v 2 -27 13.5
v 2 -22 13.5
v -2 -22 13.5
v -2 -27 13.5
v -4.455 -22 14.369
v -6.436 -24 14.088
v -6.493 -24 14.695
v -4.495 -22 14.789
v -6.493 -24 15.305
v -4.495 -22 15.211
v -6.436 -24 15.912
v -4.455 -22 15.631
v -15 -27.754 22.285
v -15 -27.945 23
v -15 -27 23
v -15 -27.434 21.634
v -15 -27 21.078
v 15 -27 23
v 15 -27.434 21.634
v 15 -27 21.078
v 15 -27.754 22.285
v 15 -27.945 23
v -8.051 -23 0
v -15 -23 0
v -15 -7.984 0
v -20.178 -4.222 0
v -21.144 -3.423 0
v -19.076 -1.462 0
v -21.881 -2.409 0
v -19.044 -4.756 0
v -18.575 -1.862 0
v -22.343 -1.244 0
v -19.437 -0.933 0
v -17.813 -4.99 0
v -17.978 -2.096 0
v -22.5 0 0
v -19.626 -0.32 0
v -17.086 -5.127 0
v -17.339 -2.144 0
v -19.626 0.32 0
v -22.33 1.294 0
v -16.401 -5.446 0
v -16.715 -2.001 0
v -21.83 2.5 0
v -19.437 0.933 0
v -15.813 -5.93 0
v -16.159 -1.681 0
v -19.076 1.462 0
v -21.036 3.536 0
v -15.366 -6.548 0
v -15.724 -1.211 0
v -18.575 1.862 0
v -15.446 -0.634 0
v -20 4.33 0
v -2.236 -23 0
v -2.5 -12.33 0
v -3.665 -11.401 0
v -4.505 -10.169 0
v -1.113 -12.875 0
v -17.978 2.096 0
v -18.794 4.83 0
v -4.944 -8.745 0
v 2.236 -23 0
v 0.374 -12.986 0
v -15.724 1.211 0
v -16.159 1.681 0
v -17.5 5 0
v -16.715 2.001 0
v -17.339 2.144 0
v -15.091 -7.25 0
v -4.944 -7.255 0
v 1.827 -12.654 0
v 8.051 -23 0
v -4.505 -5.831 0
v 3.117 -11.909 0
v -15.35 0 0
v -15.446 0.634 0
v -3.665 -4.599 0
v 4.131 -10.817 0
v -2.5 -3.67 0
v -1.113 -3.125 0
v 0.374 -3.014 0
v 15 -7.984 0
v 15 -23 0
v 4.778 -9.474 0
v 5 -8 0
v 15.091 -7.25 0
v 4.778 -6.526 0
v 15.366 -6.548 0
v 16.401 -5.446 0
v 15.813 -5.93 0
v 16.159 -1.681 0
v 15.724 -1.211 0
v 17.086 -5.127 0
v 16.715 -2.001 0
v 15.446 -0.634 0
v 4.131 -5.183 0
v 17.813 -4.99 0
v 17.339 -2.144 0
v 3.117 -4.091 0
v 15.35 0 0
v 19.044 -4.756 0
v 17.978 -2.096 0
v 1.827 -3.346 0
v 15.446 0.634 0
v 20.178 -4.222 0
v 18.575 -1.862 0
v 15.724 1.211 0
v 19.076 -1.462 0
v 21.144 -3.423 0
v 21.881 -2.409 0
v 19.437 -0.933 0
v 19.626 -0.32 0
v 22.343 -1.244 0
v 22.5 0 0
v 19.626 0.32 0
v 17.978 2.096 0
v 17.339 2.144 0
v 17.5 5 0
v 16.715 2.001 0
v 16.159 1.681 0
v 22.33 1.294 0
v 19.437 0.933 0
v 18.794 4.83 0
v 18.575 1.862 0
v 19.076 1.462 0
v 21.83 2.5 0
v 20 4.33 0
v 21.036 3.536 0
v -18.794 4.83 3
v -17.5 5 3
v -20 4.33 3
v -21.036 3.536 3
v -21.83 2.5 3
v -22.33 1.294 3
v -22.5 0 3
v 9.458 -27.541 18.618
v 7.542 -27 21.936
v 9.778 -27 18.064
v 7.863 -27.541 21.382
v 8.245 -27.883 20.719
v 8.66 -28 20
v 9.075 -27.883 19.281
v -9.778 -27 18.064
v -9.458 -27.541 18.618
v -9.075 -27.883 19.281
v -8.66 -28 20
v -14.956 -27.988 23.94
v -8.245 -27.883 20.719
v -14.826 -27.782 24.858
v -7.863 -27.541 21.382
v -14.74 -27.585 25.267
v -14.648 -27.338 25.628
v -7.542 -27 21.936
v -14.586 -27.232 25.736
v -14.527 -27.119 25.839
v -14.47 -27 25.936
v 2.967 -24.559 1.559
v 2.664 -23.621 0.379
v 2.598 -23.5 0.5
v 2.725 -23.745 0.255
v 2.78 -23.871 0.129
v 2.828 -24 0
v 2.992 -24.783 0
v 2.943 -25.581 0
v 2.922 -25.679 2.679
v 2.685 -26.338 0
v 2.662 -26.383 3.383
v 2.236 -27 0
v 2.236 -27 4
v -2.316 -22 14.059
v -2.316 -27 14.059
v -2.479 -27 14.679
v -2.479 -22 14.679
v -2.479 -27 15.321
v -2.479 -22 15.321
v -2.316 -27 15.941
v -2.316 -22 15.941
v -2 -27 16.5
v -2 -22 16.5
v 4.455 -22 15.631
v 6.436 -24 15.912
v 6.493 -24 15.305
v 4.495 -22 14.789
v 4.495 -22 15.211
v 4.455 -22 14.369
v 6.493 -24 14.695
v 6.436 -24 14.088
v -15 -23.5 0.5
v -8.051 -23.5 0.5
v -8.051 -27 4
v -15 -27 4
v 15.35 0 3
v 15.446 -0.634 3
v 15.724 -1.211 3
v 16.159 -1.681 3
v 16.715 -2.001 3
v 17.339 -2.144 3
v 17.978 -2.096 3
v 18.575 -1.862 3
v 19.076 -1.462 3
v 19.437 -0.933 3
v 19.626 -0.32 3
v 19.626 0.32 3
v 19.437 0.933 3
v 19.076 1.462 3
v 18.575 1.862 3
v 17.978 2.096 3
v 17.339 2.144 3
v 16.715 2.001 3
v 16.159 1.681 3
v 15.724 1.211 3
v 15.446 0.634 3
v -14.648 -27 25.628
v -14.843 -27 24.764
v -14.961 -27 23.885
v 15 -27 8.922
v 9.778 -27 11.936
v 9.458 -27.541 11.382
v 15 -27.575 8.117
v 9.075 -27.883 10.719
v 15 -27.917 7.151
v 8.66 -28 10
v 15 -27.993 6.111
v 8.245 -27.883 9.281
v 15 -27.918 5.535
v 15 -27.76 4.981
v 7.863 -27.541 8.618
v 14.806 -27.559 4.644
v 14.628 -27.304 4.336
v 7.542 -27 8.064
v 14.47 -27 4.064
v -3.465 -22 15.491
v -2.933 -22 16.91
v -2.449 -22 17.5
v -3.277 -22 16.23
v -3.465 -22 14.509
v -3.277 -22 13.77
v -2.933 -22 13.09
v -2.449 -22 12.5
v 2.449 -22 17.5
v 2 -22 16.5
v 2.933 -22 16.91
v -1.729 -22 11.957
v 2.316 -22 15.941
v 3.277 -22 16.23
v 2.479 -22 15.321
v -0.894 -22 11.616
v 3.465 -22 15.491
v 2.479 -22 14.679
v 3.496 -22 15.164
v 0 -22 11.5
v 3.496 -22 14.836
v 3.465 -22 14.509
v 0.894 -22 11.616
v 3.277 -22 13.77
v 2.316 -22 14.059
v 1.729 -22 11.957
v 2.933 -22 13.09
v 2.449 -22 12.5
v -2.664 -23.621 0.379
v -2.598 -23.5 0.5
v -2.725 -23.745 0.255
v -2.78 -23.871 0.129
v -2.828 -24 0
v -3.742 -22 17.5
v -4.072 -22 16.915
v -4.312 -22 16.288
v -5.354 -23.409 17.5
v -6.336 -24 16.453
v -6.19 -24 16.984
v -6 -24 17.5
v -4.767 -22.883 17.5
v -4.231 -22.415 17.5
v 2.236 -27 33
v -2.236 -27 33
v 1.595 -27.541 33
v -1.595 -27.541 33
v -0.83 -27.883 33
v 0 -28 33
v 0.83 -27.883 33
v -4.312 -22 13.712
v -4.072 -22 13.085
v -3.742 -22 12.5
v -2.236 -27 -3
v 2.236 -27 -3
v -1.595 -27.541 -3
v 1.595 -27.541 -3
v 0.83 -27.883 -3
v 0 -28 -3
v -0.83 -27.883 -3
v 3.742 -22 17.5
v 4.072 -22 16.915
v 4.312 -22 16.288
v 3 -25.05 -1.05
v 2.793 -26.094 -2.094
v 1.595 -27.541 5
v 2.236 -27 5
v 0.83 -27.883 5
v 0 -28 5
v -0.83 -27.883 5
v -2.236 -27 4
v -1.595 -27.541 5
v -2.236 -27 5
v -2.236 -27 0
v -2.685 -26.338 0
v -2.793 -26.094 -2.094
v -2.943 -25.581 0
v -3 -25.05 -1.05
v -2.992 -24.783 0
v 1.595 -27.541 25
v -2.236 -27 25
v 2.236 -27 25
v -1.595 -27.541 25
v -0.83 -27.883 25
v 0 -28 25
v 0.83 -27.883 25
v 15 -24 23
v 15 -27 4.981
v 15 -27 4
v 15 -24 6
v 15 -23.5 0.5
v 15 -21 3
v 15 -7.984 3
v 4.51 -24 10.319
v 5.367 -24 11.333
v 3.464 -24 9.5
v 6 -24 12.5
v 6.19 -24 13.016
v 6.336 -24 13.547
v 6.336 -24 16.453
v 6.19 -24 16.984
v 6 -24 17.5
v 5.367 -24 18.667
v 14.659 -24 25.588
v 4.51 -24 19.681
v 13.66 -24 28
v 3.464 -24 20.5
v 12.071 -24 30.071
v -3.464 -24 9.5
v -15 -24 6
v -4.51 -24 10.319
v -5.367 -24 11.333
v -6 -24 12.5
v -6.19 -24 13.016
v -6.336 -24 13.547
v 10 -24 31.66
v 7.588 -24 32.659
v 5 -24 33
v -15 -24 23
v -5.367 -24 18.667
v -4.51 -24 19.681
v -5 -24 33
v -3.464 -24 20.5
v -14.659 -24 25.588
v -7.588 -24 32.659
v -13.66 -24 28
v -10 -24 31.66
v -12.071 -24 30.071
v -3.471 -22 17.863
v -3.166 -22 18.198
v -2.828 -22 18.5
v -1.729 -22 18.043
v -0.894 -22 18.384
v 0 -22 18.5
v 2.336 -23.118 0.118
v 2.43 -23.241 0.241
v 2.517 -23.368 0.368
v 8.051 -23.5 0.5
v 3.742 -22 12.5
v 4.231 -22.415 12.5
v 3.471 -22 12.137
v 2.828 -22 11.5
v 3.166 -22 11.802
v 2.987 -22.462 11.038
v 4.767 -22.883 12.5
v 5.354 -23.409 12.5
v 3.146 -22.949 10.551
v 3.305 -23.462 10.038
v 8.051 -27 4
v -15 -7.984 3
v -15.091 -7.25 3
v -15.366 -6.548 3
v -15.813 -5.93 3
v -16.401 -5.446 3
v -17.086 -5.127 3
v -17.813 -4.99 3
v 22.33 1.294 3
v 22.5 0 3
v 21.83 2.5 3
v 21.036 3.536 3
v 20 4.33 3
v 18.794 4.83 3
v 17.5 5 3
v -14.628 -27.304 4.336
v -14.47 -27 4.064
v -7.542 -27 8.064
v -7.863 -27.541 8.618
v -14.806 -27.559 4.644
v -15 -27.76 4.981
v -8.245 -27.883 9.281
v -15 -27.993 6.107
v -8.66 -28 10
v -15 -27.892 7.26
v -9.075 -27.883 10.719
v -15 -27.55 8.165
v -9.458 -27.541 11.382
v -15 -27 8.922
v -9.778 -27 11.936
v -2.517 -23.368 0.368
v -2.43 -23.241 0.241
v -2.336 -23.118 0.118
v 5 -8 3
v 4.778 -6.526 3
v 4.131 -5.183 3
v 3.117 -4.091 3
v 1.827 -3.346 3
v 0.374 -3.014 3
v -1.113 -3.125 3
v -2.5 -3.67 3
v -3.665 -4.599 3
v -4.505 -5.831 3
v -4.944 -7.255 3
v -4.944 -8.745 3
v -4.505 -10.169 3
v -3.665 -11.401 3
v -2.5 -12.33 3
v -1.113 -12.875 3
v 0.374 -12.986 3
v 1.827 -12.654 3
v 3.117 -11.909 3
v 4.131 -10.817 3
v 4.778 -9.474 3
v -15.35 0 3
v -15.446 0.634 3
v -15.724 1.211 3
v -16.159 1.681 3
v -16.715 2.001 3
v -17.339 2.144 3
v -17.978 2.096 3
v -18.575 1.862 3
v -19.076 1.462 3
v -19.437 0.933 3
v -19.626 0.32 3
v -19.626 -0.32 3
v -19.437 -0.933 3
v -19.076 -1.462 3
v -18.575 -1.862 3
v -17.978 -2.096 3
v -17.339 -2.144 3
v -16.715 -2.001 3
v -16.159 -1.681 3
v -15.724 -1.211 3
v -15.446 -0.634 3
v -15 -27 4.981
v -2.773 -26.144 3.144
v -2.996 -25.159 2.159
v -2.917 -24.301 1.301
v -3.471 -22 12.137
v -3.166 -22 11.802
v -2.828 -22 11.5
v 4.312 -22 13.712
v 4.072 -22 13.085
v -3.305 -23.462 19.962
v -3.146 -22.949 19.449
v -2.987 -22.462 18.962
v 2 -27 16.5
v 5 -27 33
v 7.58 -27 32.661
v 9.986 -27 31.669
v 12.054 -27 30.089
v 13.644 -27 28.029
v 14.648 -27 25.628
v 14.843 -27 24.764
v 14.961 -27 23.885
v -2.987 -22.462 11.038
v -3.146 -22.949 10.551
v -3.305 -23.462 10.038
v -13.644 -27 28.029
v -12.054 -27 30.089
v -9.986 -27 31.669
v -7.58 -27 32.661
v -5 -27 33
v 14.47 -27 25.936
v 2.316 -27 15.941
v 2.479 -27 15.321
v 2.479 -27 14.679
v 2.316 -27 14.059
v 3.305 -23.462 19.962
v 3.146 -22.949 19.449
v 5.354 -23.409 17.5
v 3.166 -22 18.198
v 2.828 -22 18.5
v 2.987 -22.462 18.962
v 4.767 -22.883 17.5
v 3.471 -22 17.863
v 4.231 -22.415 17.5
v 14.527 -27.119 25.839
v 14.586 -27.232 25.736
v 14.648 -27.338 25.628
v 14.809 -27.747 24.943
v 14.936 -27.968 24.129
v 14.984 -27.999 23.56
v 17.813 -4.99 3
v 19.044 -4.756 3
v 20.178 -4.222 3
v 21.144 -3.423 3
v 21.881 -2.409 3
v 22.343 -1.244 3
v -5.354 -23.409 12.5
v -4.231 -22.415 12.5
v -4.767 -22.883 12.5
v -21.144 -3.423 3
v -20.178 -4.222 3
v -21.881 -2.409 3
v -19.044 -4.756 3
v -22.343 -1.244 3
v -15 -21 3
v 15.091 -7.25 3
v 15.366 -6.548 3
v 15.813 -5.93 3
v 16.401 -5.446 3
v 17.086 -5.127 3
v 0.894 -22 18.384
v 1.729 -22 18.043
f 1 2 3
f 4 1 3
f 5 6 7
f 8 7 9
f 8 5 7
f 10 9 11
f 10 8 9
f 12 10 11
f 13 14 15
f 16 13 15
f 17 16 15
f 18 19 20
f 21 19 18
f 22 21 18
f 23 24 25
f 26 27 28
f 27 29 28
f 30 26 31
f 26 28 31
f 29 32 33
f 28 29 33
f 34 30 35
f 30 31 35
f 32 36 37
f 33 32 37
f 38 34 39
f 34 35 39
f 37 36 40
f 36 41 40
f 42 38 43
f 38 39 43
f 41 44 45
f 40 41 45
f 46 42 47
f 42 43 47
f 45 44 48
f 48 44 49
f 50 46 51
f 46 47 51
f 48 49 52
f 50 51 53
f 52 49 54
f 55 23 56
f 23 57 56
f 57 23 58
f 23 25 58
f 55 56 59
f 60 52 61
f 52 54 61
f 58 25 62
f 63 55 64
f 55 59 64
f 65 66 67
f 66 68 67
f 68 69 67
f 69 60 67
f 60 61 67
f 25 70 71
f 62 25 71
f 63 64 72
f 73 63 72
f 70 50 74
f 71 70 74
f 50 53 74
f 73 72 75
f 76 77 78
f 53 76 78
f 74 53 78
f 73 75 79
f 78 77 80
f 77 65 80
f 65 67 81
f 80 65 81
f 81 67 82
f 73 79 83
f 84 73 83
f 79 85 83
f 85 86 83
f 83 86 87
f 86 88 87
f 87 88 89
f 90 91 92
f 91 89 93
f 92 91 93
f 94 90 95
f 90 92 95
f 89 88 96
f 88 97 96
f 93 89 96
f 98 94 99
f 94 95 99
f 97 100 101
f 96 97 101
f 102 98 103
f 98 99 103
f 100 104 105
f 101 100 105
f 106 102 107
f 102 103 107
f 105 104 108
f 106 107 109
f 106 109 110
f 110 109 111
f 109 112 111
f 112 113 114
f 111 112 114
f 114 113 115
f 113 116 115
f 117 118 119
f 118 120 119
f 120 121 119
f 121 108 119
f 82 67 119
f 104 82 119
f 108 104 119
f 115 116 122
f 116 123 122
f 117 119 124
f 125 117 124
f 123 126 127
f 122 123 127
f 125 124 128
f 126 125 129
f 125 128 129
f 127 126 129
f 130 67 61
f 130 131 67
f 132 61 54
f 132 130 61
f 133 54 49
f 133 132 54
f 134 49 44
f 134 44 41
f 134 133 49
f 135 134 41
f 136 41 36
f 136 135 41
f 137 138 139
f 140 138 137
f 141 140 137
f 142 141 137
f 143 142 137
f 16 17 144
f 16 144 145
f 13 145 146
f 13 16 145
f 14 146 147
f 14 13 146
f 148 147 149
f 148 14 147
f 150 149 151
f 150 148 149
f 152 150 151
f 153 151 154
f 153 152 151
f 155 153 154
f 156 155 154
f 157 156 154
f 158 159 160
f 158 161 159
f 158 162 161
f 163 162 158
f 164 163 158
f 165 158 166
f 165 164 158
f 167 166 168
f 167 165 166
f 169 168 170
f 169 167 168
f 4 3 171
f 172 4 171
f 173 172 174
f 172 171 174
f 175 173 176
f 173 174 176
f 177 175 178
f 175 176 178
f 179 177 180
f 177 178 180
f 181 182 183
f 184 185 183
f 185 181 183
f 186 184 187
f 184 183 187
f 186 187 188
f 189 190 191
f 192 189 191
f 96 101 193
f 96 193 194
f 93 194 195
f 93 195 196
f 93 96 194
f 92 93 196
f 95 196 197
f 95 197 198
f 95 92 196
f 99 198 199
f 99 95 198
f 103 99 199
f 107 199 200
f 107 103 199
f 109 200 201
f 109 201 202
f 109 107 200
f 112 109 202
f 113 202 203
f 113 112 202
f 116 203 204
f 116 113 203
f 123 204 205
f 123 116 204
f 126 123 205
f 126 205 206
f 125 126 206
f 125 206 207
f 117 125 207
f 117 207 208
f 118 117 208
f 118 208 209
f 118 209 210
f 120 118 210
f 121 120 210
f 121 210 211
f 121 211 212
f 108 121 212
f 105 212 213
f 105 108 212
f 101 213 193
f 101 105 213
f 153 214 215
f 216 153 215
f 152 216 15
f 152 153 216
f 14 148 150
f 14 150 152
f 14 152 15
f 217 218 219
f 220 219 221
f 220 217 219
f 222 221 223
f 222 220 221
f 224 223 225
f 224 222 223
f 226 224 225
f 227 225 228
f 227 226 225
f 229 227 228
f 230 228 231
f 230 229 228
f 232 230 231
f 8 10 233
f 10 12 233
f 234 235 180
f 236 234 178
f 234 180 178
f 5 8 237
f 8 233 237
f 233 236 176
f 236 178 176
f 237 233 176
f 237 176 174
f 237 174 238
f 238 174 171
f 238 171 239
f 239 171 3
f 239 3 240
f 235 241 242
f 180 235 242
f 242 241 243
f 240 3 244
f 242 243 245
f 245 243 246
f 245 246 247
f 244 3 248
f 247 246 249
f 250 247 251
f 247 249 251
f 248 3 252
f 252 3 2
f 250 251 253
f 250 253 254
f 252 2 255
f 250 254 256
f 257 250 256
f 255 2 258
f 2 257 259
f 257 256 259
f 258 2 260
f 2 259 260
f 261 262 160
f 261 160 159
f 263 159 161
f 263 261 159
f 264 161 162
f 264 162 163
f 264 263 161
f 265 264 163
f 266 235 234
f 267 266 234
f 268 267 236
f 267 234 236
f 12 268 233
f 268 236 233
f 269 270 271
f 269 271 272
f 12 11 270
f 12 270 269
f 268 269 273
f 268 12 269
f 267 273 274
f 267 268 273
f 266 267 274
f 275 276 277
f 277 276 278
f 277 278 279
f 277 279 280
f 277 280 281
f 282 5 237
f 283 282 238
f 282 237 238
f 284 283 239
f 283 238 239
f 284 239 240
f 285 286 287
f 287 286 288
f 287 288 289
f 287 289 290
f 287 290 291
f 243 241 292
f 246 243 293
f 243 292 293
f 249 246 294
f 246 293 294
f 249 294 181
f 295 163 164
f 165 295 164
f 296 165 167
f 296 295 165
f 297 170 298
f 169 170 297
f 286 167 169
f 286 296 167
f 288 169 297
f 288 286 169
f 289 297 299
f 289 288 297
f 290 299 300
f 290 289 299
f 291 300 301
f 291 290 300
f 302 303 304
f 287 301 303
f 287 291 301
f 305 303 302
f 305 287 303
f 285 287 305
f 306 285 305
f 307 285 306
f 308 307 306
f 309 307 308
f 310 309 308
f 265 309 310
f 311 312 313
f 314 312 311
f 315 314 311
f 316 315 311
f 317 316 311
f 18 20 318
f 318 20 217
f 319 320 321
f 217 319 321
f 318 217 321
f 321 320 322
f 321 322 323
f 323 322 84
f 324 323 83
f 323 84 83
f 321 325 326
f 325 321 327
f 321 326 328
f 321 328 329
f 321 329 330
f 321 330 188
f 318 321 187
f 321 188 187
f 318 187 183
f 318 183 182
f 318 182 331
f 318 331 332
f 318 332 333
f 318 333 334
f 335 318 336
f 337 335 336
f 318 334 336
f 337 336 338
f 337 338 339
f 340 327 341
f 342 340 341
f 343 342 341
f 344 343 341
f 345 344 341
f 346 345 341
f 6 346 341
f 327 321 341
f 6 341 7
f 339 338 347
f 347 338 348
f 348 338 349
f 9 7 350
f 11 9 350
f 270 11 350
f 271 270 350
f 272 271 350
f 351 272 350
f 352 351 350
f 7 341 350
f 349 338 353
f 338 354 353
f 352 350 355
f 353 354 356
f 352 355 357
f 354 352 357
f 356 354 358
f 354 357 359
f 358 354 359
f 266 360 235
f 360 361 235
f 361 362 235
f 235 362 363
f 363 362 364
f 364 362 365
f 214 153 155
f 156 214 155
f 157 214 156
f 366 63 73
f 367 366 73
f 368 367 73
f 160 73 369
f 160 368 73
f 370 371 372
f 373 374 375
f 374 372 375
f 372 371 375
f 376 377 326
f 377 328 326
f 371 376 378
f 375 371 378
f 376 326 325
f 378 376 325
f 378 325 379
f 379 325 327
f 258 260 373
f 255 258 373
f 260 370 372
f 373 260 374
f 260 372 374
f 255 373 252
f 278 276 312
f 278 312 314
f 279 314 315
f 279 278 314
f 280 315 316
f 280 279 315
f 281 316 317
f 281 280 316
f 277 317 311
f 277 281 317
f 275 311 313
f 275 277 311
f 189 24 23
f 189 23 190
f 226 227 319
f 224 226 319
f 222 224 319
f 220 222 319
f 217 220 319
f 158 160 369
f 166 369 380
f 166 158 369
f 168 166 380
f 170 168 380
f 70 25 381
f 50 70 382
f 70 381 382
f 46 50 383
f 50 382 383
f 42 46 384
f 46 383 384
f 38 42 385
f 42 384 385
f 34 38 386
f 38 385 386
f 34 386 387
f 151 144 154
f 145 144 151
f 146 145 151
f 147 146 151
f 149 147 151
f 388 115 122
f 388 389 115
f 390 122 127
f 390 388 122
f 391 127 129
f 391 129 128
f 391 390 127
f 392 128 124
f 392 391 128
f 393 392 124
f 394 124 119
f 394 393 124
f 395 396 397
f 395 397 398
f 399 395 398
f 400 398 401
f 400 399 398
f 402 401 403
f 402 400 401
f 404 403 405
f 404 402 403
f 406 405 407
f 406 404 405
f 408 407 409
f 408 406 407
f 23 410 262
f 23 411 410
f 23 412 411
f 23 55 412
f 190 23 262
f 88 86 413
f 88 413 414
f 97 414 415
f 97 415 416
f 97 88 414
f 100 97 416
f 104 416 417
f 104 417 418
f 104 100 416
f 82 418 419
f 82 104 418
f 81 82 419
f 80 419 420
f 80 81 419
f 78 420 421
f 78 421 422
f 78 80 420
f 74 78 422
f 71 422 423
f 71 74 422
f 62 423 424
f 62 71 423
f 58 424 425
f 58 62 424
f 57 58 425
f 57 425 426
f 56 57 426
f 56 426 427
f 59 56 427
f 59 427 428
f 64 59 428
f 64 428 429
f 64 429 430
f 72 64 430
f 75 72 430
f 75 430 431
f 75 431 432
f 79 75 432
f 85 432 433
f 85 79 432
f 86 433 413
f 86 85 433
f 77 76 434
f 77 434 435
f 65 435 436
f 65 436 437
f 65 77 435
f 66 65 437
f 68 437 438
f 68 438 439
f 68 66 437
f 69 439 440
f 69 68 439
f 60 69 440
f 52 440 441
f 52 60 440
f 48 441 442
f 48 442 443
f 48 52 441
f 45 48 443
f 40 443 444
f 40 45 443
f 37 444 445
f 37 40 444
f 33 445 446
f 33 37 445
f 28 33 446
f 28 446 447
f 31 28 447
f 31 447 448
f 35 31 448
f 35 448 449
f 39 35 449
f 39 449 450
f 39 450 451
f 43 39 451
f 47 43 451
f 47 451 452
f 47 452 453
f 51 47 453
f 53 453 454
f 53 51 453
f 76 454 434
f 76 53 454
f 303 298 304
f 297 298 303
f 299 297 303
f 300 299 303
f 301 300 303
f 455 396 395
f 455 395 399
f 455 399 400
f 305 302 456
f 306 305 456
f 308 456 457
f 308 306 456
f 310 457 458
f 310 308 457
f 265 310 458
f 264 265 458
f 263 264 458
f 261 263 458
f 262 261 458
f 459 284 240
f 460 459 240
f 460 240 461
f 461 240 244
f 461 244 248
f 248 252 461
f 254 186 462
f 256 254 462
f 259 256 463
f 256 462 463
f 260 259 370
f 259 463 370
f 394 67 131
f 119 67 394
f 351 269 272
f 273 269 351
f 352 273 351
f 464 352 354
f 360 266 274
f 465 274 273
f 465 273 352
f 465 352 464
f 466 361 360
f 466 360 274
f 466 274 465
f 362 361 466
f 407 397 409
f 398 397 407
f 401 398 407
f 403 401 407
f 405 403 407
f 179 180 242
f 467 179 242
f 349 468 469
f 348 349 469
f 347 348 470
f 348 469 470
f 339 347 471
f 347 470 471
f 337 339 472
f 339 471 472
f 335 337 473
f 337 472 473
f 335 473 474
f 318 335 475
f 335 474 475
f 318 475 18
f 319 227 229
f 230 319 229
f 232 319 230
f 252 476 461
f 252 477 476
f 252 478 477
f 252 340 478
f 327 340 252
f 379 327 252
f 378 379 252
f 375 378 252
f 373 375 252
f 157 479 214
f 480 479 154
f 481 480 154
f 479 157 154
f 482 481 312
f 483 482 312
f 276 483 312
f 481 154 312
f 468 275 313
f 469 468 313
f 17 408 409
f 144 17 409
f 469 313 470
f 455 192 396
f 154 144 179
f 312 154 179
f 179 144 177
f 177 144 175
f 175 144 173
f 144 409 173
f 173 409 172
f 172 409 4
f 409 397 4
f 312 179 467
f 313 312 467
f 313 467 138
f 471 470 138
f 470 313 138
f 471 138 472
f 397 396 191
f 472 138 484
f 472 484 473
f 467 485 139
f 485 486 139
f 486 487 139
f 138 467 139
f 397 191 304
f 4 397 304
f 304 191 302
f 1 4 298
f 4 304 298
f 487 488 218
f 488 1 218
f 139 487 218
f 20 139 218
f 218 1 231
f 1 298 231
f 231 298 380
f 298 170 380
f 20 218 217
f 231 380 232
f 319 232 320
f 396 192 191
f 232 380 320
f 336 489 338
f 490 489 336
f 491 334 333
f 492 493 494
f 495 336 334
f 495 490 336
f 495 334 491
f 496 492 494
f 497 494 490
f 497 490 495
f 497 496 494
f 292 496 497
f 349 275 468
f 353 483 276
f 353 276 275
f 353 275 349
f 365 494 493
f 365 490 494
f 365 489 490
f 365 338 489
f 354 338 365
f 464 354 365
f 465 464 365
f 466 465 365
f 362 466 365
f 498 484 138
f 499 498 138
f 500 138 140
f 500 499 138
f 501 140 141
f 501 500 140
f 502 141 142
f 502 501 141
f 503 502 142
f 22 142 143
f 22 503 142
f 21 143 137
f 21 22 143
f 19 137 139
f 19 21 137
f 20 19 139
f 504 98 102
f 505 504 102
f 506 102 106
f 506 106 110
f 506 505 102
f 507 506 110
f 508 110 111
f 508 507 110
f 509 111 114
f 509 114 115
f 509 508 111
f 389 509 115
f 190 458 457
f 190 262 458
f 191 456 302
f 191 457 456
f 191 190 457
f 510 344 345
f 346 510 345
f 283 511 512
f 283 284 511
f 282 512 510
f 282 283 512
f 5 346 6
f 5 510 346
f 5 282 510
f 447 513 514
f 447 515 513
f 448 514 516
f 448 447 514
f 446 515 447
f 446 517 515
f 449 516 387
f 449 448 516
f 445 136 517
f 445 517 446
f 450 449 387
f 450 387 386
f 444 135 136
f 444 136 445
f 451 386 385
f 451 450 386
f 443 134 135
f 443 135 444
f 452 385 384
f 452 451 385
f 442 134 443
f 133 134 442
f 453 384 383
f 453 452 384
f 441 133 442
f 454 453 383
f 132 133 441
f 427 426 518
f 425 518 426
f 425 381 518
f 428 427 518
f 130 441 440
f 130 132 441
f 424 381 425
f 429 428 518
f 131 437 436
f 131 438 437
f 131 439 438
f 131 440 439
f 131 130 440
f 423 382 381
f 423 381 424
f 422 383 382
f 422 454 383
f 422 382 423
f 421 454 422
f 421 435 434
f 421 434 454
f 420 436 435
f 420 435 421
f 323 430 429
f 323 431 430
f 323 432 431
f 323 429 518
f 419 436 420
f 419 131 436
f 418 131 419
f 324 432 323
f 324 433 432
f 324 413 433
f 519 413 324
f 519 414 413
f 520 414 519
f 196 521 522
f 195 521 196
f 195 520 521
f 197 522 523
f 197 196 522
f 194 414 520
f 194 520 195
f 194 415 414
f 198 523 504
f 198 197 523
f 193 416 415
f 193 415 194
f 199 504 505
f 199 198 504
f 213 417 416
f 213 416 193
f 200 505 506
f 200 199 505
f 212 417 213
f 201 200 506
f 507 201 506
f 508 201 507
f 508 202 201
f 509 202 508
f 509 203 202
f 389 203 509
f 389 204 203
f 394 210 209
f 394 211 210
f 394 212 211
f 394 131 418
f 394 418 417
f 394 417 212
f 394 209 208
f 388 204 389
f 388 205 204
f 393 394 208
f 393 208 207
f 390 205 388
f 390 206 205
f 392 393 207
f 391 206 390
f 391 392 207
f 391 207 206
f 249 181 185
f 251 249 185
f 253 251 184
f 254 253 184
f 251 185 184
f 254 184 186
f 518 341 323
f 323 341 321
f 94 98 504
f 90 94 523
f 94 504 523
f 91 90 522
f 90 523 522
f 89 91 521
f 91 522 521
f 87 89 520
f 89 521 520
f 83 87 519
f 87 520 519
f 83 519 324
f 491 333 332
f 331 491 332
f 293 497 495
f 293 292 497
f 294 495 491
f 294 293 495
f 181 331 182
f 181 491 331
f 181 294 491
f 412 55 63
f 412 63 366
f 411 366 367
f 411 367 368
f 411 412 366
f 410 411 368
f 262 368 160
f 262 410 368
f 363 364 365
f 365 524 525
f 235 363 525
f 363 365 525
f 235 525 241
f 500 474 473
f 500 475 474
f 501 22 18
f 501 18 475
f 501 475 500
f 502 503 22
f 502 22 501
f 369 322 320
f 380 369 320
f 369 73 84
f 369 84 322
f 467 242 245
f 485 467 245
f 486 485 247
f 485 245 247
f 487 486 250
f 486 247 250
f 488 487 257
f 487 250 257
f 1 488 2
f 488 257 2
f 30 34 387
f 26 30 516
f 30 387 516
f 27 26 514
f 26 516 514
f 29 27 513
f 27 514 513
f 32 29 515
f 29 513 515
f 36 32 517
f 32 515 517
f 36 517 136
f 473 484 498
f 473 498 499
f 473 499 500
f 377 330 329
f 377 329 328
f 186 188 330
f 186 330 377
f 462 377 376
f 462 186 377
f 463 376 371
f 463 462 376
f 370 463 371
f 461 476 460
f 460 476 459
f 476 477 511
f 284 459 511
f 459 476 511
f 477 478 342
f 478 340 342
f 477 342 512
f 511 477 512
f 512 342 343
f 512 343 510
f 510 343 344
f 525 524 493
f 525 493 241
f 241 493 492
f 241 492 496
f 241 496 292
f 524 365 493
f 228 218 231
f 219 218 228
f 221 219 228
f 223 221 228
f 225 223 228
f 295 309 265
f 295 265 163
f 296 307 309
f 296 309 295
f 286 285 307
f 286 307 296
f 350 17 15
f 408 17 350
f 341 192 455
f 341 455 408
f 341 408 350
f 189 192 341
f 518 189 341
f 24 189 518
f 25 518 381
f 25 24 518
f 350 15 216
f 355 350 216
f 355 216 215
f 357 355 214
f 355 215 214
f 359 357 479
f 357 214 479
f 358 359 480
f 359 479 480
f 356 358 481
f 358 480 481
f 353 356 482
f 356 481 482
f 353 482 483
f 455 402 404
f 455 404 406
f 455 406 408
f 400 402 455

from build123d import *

# Parameters (mm, degrees)
SKETCH1_W               = 45
SKETCH1_H               = 32
SKETCH1_R               = 2.15
SKETCH1_R_2             = 5
BOSS_EXTRUDE1_DEPTH     = 3
SKETCH3_W               = 30
SKETCH3_H               = 3
EXTRUDE_THIN1_DEPTH     = 15
CUT_EXTRUDE1_DEPTH      = 50.35838328
CUT_EXTRUDE2_DEPTH      = 47.208765402
CUT_EXTRUDE2_DEPTH_BACK = 47.208765402
SKETCH5_W               = 7.5
SKETCH5_H               = 22
EXTRUDE_THIN2_START     = 2
EXTRUDE_THIN2_DEPTH     = 2
CHAMFER1_SIZE           = 3
BOSS_EXTRUDE3_DEPTH     = 8
CIRPATTERN1_COUNT       = 6
CHAMFER4_SIZE           = 3
FILLET1_R               = 10
CHAMFER2_SIZE           = 4
CHAMFER3_SIZE           = 3
FILLET2_R               = 5
FILLET3_R               = 3
INTERSECT1_START        = -28.000000924
INTERSECT1_DEPTH        = 1.000000924


# Read off the part's stored shape, not the designer's step: Intersect1
# Some blends are built 0.0001 mm under size
with BuildPart() as part:
    # Sketch1 → Boss-Extrude1 (new body)
    with BuildSketch(Plane.XY):
        with Locations((0, -11)):
            Rectangle(SKETCH1_W, SKETCH1_H)
        with Locations((-17.5, 0)):
            Circle(SKETCH1_R, mode=Mode.SUBTRACT)
        with Locations(Location((17.5, 0, 0), (0, 0, 180))):
            Circle(SKETCH1_R, mode=Mode.SUBTRACT)
        with Locations((0, -8)):
            Circle(SKETCH1_R_2, mode=Mode.SUBTRACT)
    extrude(amount=BOSS_EXTRUDE1_DEPTH)

    # Sketch3 → Extrude-Thin1 (add, symmetric)
    with BuildSketch(Plane.ZY):
        with Locations((18, -25.5)):
            Rectangle(SKETCH3_W, SKETCH3_H)
    extrude(amount=EXTRUDE_THIN1_DEPTH, both=True)

    # Sketch4 → Cut-Extrude1 (cut, through all)
    with BuildSketch(Plane(origin=(0, -24, 0), x_dir=(1, 0, 0), z_dir=(0, 1, 0))):
        with BuildLine():
            Line((-2, -13.5), (2, -13.5))
            ThreePointArc((2, -13.5), (2.5, -15), (2, -16.5))
            Line((2, -16.5), (-2, -16.5))
            ThreePointArc((-2, -16.5), (-2.5, -15), (-2, -13.5))
        make_face()
    extrude(amount=-CUT_EXTRUDE1_DEPTH, mode=Mode.SUBTRACT)

    # Sketch5 → Cut-Extrude2 (cut, two sides: drawn at the far end of the back side and taken through both)
    with BuildSketch(Plane.XY.offset(3).offset(-CUT_EXTRUDE2_DEPTH_BACK)):
        with Locations((-18.75, -16)):
            Rectangle(SKETCH5_W, SKETCH5_H)
        with Locations((18.75, -16)):
            Rectangle(SKETCH5_W, SKETCH5_H)
    extrude(amount=CUT_EXTRUDE2_DEPTH + CUT_EXTRUDE2_DEPTH_BACK, mode=Mode.SUBTRACT)

    # Sketch6 → Extrude-Thin2 (add)
    with BuildSketch(Plane(origin=(0, -24, 0), x_dir=(1, 0, 0), z_dir=(0, 1, 0)).offset(EXTRUDE_THIN2_START)):
        with BuildLine():
            Line((-2.449489743, -17.5), (2.449489743, -17.5))
            ThreePointArc((2.449489743, -17.5), (3.5, -15), (2.449489743, -12.5))
            Line((2.449489743, -12.5), (-2.449489743, -12.5))
            ThreePointArc((-2.449489743, -12.5), (-3.5, -15), (-2.449489743, -17.5))
        make_face()
        with BuildLine():
            Line((-2, -16.5), (2, -16.5))
            ThreePointArc((2, -16.5), (2.5, -15), (2, -13.5))
            Line((2, -13.5), (-2, -13.5))
            ThreePointArc((-2, -13.5), (-2.5, -15), (-2, -16.5))
        make_face(mode=Mode.SUBTRACT)
    extrude(amount=-EXTRUDE_THIN2_DEPTH)

    # Chamfer1
    # the kernel refuses this chamfer: 3 mm, written as the material it adds along each edge
    with BuildSketch(Plane(origin=(10.164538707, -24, 12.5), x_dir=(0, -0.02749587661058678, -0.9996219169112968), z_dir=(-1, 0, 0))) as chamfer1_piece_1_section:
        Polygon((CHAMFER1_SIZE * 0.999621916911, -CHAMFER1_SIZE * 0.0274958766106), (-CHAMFER1_SIZE * 0.0274958766106, -CHAMFER1_SIZE * 0.999621916911), (0, 0), align=None)
    chamfer1_piece_1 = extrude(amount=20.329077413, mode=Mode.PRIVATE)
    chamfer1_piece_1 = split(chamfer1_piece_1, bisect_by=Plane(origin=(7e-09, -22, 12.12784901), z_dir=(0, -1, 0)), keep=Keep.TOP, mode=Mode.PRIVATE)
    chamfer1_piece_1 = chamfer1_piece_1 & Plane(origin=(0, -23.022077553, 15), x_dir=(0.699854212223763, 0, 0.7142857142857164), z_dir=(0, 1, 0)) * Cylinder(3.5, 53, mode=Mode.PRIVATE)
    add(chamfer1_piece_1)
    with BuildSketch(Plane(origin=(0, -24, 15), x_dir=(0.9901066627399402, 0, -0.140316771620424), z_dir=(0.140316771620424, 0, 0.9901066627399402))) as chamfer1_piece_2_section:
        Polygon((3.5 + CHAMFER1_SIZE, 0), (3.5, CHAMFER1_SIZE), (3.5, 0), align=None)
    chamfer1_piece_2 = revolve(axis=Axis((0, -24, 15), (0, 1, 0)), revolution_arc=343.867646272, mode=Mode.PRIVATE)
    chamfer1_piece_2 = split(chamfer1_piece_2, bisect_by=Plane(origin=(4.19137438, -22, 13.401943095), z_dir=(0, -1, 0)), keep=Keep.TOP, mode=Mode.PRIVATE)
    chamfer1_piece_2 = split(chamfer1_piece_2, bisect_by=Plane(origin=(4.19137438, -23.188236886, 17.5), z_dir=(0, 0, -1)), keep=Keep.TOP, mode=Mode.PRIVATE)
    chamfer1_piece_2 = split(chamfer1_piece_2, bisect_by=Plane(origin=(4.19137438, -23.188236886, 12.5), z_dir=(0, 0, 1)), keep=Keep.TOP, mode=Mode.PRIVATE)
    add(chamfer1_piece_2)
    with BuildSketch(Plane(origin=(0, -24, 15), x_dir=(-0.9901066627399404, 0, 0.14031677162042244), z_dir=(-0.14031677162042244, 0, -0.9901066627399404))) as chamfer1_piece_3_section:
        Polygon((3.5, CHAMFER1_SIZE), (3.5 + CHAMFER1_SIZE, 0), (3.5, 0), align=None)
    chamfer1_piece_3 = revolve(axis=Axis((0, -24, 15), (0, 1, 0)), revolution_arc=343.867646272, mode=Mode.PRIVATE)
    chamfer1_piece_3 = split(chamfer1_piece_3, bisect_by=Plane(origin=(-4.191374251, -22, 16.598056899), z_dir=(0, -1, 0)), keep=Keep.TOP, mode=Mode.PRIVATE)
    chamfer1_piece_3 = split(chamfer1_piece_3, bisect_by=Plane(origin=(-4.191374251, -23.188236825, 17.5), z_dir=(0, 0, -1)), keep=Keep.TOP, mode=Mode.PRIVATE)
    chamfer1_piece_3 = split(chamfer1_piece_3, bisect_by=Plane(origin=(-4.191374251, -23.188236825, 12.5), z_dir=(0, 0, 1)), keep=Keep.TOP, mode=Mode.PRIVATE)
    add(chamfer1_piece_3)
    with BuildSketch(Plane(origin=(-10.164538707, -24, 17.5), x_dir=(0, -0.027495876610586768, 0.9996219169112968), z_dir=(1, 0, 0))) as chamfer1_piece_4_section:
        Polygon((CHAMFER1_SIZE * 0.999621916911, -CHAMFER1_SIZE * 0.0274958766106), (-CHAMFER1_SIZE * 0.0274958766106, -CHAMFER1_SIZE * 0.999621916911), (0, 0), align=None)
    chamfer1_piece_4 = extrude(amount=20.329077413, mode=Mode.PRIVATE)
    chamfer1_piece_4 = split(chamfer1_piece_4, bisect_by=Plane(origin=(-7e-09, -22, 17.87215099), z_dir=(0, -1, 0)), keep=Keep.TOP, mode=Mode.PRIVATE)
    chamfer1_piece_4 = chamfer1_piece_4 & Plane(origin=(0, -23.022077553, 15), x_dir=(0.699854212223763, 0, 0.7142857142857164), z_dir=(0, 1, 0)) * Cylinder(3.5, 53, mode=Mode.PRIVATE)
    add(chamfer1_piece_4)
    with BuildSketch(Plane(origin=(0, -24, 15), x_dir=(-0.9901066627399404, 0, 0.14031677162042244), z_dir=(-0.14031677162042244, 0, -0.9901066627399404))) as chamfer1_piece_5a_section:
        Polygon((3.5, CHAMFER1_SIZE), (3.5 + CHAMFER1_SIZE, 0), (3.5, 0), align=None)
    chamfer1_piece_5a = revolve(axis=Axis((0, -24, 15), (0, 1, 0)), revolution_arc=343.867646272, mode=Mode.PRIVATE)
    chamfer1_piece_5a = split(chamfer1_piece_5a, bisect_by=Plane(origin=(0, -22, 10.999585628), z_dir=(0, -1, 0)), keep=Keep.TOP, mode=Mode.PRIVATE)
    chamfer1_piece_5a = split(chamfer1_piece_5a, bisect_by=Plane(origin=(0, -23.271769179, 12.5), z_dir=(0, 0, -1)), keep=Keep.TOP, mode=Mode.PRIVATE)
    with BuildSketch(Plane(origin=(10.164538707, -24, 12.5), x_dir=(0, -0.02749587661058678, -0.9996219169112968), z_dir=(-1, 0, 0))) as chamfer1_piece_5b_section:
        Polygon((CHAMFER1_SIZE * 0.999621916911, -CHAMFER1_SIZE * 0.0274958766106), (-CHAMFER1_SIZE * 0.0274958766106, -CHAMFER1_SIZE * 0.999621916911), (0, 0), align=None)
    chamfer1_piece_5b = extrude(amount=20.329077413, mode=Mode.PRIVATE)
    chamfer1_piece_5b = split(chamfer1_piece_5b, bisect_by=Plane(origin=(0, -22, 11.341108232), z_dir=(0, -1, 0)), keep=Keep.TOP, mode=Mode.PRIVATE)
    chamfer1_piece_5b = chamfer1_piece_5b - Plane(origin=(0, -23.224020782, 15), x_dir=(0.699854212223763, 0, 0.7142857142857164), z_dir=(0, 1, 0)) * Cylinder(3.5, 53, mode=Mode.PRIVATE)
    chamfer1_piece_5 = chamfer1_piece_5a & chamfer1_piece_5b
    add(chamfer1_piece_5)
    with BuildSketch(Plane(origin=(10.164538707, -24, 12.5), x_dir=(0, -0.02749587661058678, -0.9996219169112968), z_dir=(-1, 0, 0))) as chamfer1_piece_6a_section:
        Polygon((CHAMFER1_SIZE * 0.999621916911, -CHAMFER1_SIZE * 0.0274958766106), (-CHAMFER1_SIZE * 0.0274958766106, -CHAMFER1_SIZE * 0.999621916911), (0, 0), align=None)
    chamfer1_piece_6a = extrude(amount=20.329077413, mode=Mode.PRIVATE)
    chamfer1_piece_6a = split(chamfer1_piece_6a, bisect_by=Plane(origin=(0, -22, 11.341108232), z_dir=(0, -1, 0)), keep=Keep.TOP, mode=Mode.PRIVATE)
    chamfer1_piece_6a = chamfer1_piece_6a - Plane(origin=(0, -23.224020782, 15), x_dir=(0.699854212223763, 0, 0.7142857142857164), z_dir=(0, 1, 0)) * Cylinder(3.5, 53, mode=Mode.PRIVATE)
    with BuildSketch(Plane(origin=(0, -24, 15), x_dir=(0.9901066627399402, 0, -0.140316771620424), z_dir=(0.140316771620424, 0, 0.9901066627399402))) as chamfer1_piece_6b_section:
        Polygon((3.5 + CHAMFER1_SIZE, 0), (3.5, CHAMFER1_SIZE), (3.5, 0), align=None)
    chamfer1_piece_6b = revolve(axis=Axis((0, -24, 15), (0, 1, 0)), revolution_arc=343.867646272, mode=Mode.PRIVATE)
    chamfer1_piece_6b = split(chamfer1_piece_6b, bisect_by=Plane(origin=(0, -22, 10.999585483), z_dir=(0, -1, 0)), keep=Keep.TOP, mode=Mode.PRIVATE)
    chamfer1_piece_6b = split(chamfer1_piece_6b, bisect_by=Plane(origin=(0, -23.271769428, 12.5), z_dir=(0, 0, -1)), keep=Keep.TOP, mode=Mode.PRIVATE)
    chamfer1_piece_6 = chamfer1_piece_6a & chamfer1_piece_6b
    add(chamfer1_piece_6)
    with BuildSketch(Plane(origin=(0, -24, 15), x_dir=(0.9901066627399402, 0, -0.140316771620424), z_dir=(0.140316771620424, 0, 0.9901066627399402))) as chamfer1_piece_7a_section:
        Polygon((3.5 + CHAMFER1_SIZE, 0), (3.5, CHAMFER1_SIZE), (3.5, 0), align=None)
    chamfer1_piece_7a = revolve(axis=Axis((0, -24, 15), (0, 1, 0)), revolution_arc=343.867646272, mode=Mode.PRIVATE)
    chamfer1_piece_7a = split(chamfer1_piece_7a, bisect_by=Plane(origin=(2e-09, -22, 19.000414518), z_dir=(0, -1, 0)), keep=Keep.TOP, mode=Mode.PRIVATE)
    chamfer1_piece_7a = split(chamfer1_piece_7a, bisect_by=Plane(origin=(2e-09, -23.271769429, 17.5), z_dir=(0, 0, 1)), keep=Keep.TOP, mode=Mode.PRIVATE)
    with BuildSketch(Plane(origin=(-10.164538707, -24, 17.5), x_dir=(0, -0.027495876610586768, 0.9996219169112968), z_dir=(1, 0, 0))) as chamfer1_piece_7b_section:
        Polygon((CHAMFER1_SIZE * 0.999621916911, -CHAMFER1_SIZE * 0.0274958766106), (-CHAMFER1_SIZE * 0.0274958766106, -CHAMFER1_SIZE * 0.999621916911), (0, 0), align=None)
    chamfer1_piece_7b = extrude(amount=20.329077413, mode=Mode.PRIVATE)
    chamfer1_piece_7b = split(chamfer1_piece_7b, bisect_by=Plane(origin=(1e-09, -22, 18.658891768), z_dir=(0, -1, 0)), keep=Keep.TOP, mode=Mode.PRIVATE)
    chamfer1_piece_7b = chamfer1_piece_7b - Plane(origin=(0, -23.224020782, 15), x_dir=(0.699854212223763, 0, 0.7142857142857164), z_dir=(0, 1, 0)) * Cylinder(3.5, 53, mode=Mode.PRIVATE)
    chamfer1_piece_7 = chamfer1_piece_7a & chamfer1_piece_7b
    add(chamfer1_piece_7)
    with BuildSketch(Plane(origin=(0, -24, 15), x_dir=(-0.9901066627399404, 0, 0.14031677162042244), z_dir=(-0.14031677162042244, 0, -0.9901066627399404))) as chamfer1_piece_8a_section:
        Polygon((3.5, CHAMFER1_SIZE), (3.5 + CHAMFER1_SIZE, 0), (3.5, 0), align=None)
    chamfer1_piece_8a = revolve(axis=Axis((0, -24, 15), (0, 1, 0)), revolution_arc=343.867646272, mode=Mode.PRIVATE)
    chamfer1_piece_8a = split(chamfer1_piece_8a, bisect_by=Plane(origin=(0, -22, 19.000414372), z_dir=(0, -1, 0)), keep=Keep.TOP, mode=Mode.PRIVATE)
    chamfer1_piece_8a = split(chamfer1_piece_8a, bisect_by=Plane(origin=(0, -23.27176918, 17.5), z_dir=(0, 0, 1)), keep=Keep.TOP, mode=Mode.PRIVATE)
    with BuildSketch(Plane(origin=(-10.164538707, -24, 17.5), x_dir=(0, -0.027495876610586768, 0.9996219169112968), z_dir=(1, 0, 0))) as chamfer1_piece_8b_section:
        Polygon((CHAMFER1_SIZE * 0.999621916911, -CHAMFER1_SIZE * 0.0274958766106), (-CHAMFER1_SIZE * 0.0274958766106, -CHAMFER1_SIZE * 0.999621916911), (0, 0), align=None)
    chamfer1_piece_8b = extrude(amount=20.329077413, mode=Mode.PRIVATE)
    chamfer1_piece_8b = split(chamfer1_piece_8b, bisect_by=Plane(origin=(1e-09, -22, 18.658891768), z_dir=(0, -1, 0)), keep=Keep.TOP, mode=Mode.PRIVATE)
    chamfer1_piece_8b = chamfer1_piece_8b - Plane(origin=(0, -23.224020782, 15), x_dir=(0.699854212223763, 0, 0.7142857142857164), z_dir=(0, 1, 0)) * Cylinder(3.5, 53, mode=Mode.PRIVATE)
    chamfer1_piece_8 = chamfer1_piece_8a & chamfer1_piece_8b
    add(chamfer1_piece_8)

    # Sketch8 → Boss-Extrude3 (add)
    with BuildSketch(Plane(origin=(0, 0, 33), x_dir=(-1, 0, 0), z_dir=(0, 0, -1))):
        with BuildLine():
            Line((-2.236067977, -27), (2.236067977, -27))
            ThreePointArc((2.236067977, -27), (0, -28), (-2.236067977, -27))
        make_face()
    boss_extrude3 = extrude(amount=BOSS_EXTRUDE3_DEPTH)

    # CirPattern1: Boss-Extrude3 ×6 about axis
    cirpattern1_axis = Axis((0, 0, 15), (0, 1, 0))
    for i in range(1, CIRPATTERN1_COUNT):
        add(boss_extrude3.rotate(cirpattern1_axis, i * 360 / CIRPATTERN1_COUNT))

    # Chamfer4
    chamfer4_edges = [part.edges().sort_by_distance(p)[0] for p in [
        (0, -27, 0),
    ]]
    chamfer(chamfer4_edges, length=CHAMFER4_SIZE - 0.0001)  # a hair under: the kernel refuses the full size

    # Fillet1
    # the kernel refuses this fillet: 10 mm, written as the material it takes off along each edge
    with BuildSketch(Plane(origin=(-15, -27, 33), x_dir=(0, 0, -1), z_dir=(0, 1, 0))) as fillet1_piece_1:
        with BuildLine():
            CenterArc((FILLET1_R, -FILLET1_R), FILLET1_R, 90, 90)
            Line((0, -FILLET1_R), (0, 0))
            Line((0, 0), (FILLET1_R, 0))
        make_face()
    extrude(amount=28, mode=Mode.SUBTRACT)
    with BuildSketch(Plane(origin=(15, -27, 33), x_dir=(0, 0, -1), z_dir=(0, 1, 0))) as fillet1_piece_2:
        with BuildLine():
            CenterArc((FILLET1_R, FILLET1_R), FILLET1_R, 180, 90)
            Line((0, FILLET1_R), (0, 0))
            Line((0, 0), (FILLET1_R, 0))
        make_face()
    extrude(amount=28, mode=Mode.SUBTRACT)

    # Chamfer2
    # the kernel refuses this chamfer: 4 mm, written as the material it takes off along each edge
    with BuildSketch(Plane(origin=(-25.286731952, -27, 0), x_dir=(0, 0.9996219169112968, -0.027495876610586365), z_dir=(1, 0, 0))) as chamfer2_piece_1_section:
        Polygon((CHAMFER2_SIZE * 0.999621916911, CHAMFER2_SIZE * 0.0274958766106), (-CHAMFER2_SIZE * 0.0274958766106, CHAMFER2_SIZE * 0.999621916911), (0, 0), align=None)
    chamfer2_piece_1 = extrude(amount=33.337395926, mode=Mode.PRIVATE)
    chamfer2_piece_1 = chamfer2_piece_1 - Plane(origin=(0, -25, 0.166625049), x_dir=(0.7453559924999285, -0.6666666666666683, 0), z_dir=(0, 0, -1)) * Cylinder(3, 83, mode=Mode.PRIVATE)
    add(chamfer2_piece_1, mode=Mode.SUBTRACT)
    with BuildSketch(Plane(origin=(-25.286731952, -27, 0), x_dir=(0, 0.9996219169112968, -0.027495876610586365), z_dir=(1, 0, 0))) as chamfer2_piece_2_section:
        Polygon((CHAMFER2_SIZE * 0.999621916911, CHAMFER2_SIZE * 0.0274958766106), (-CHAMFER2_SIZE * 0.0274958766106, CHAMFER2_SIZE * 0.999621916911), (0, 0), align=None)
    chamfer2_piece_2 = extrude(amount=33.337395926, mode=Mode.PRIVATE)
    chamfer2_piece_2 = split(chamfer2_piece_2, bisect_by=Plane(origin=(8e-08, -23.671290362, 0.328809638), z_dir=(0, 0.7071067811865475, -0.7071067811865476)), keep=Keep.TOP, mode=Mode.PRIVATE)
    add(chamfer2_piece_2, mode=Mode.SUBTRACT)
    with BuildSketch(Plane(origin=(-8.050663974, -27, 0), x_dir=(0, 0.9996219169112968, -0.027495876610586365), z_dir=(1, 0, 0))) as chamfer2_piece_3_section:
        Polygon((CHAMFER2_SIZE * 0.999621916911, CHAMFER2_SIZE * 0.0274958766106), (-CHAMFER2_SIZE * 0.0274958766106, CHAMFER2_SIZE * 0.999621916911), (0, 0), align=None)
    chamfer2_piece_3 = extrude(amount=33.337395926, mode=Mode.PRIVATE)
    chamfer2_piece_3 = chamfer2_piece_3 - Plane(origin=(0, -25, 0.16655092), x_dir=(0.7453559924999285, -0.6666666666666683, 0), z_dir=(0, 0, -1)) * Cylinder(3, 83, mode=Mode.PRIVATE)
    add(chamfer2_piece_3, mode=Mode.SUBTRACT)
    with BuildSketch(Plane(origin=(-8.050663974, -27, 0), x_dir=(0, 0.9996219169112968, -0.027495876610586365), z_dir=(1, 0, 0))) as chamfer2_piece_4_section:
        Polygon((CHAMFER2_SIZE * 0.999621916911, CHAMFER2_SIZE * 0.0274958766106), (-CHAMFER2_SIZE * 0.0274958766106, CHAMFER2_SIZE * 0.999621916911), (0, 0), align=None)
    chamfer2_piece_4 = extrude(amount=33.337395926, mode=Mode.PRIVATE)
    chamfer2_piece_4 = split(chamfer2_piece_4, bisect_by=Plane(origin=(8e-08, -23.671290362, 0.328809638), z_dir=(0, 0.7071067811865475, -0.7071067811865476)), keep=Keep.TOP, mode=Mode.PRIVATE)
    add(chamfer2_piece_4, mode=Mode.SUBTRACT)

    # Chamfer3
    chamfer3_edges = [part.edges().sort_by_distance(p)[0] for p in [
        (0, -24, 3),
    ]]
    chamfer(chamfer3_edges, length=CHAMFER3_SIZE)

    # Fillet2
    fillet2_edges = [part.edges().sort_by_distance(p)[0] for p in [
        (22.5, 5, 1.5),
        (22.5, -5, 1.5),
        (-22.5, -5, 1.5),
        (-22.5, 5, 1.5),
    ]]
    fillet(fillet2_edges, radius=FILLET2_R - 0.0001)  # a hair under: the kernel refuses the full size

    # Fillet3
    fillet3_edges = [part.edges().sort_by_distance(p)[0] for p in [
        (15, -5, 1.5),
        (-15, -5, 1.5),
    ]]
    fillet(fillet3_edges, radius=FILLET3_R)

    # Intersect1 outline → Intersect1 (cut)
    with BuildSketch(Plane(origin=(0, 0, 0), x_dir=(1, 0, 0), z_dir=(0, 1, 0)).offset(INTERSECT1_START)):
        with BuildLine():
            Line((16.706491257, -7.936491673), (15, -4.980762114))
            Line((15, -4.980762114), (15, -23))
            ThreePointArc((15, -23), (14.911730056, -24.325747825), (14.648478541, -25.628090913))
            Line((14.648478541, -25.628090913), (16.706491257, -22.063508327))
            Line((16.706491257, -22.063508327), (18, -19.823085465))
            Line((18, -19.823085465), (18, -10.176914535))
            Line((18, -10.176914535), (16.706491257, -7.936491673))
        make_face()
        with BuildLine():
            Line((-15, -23), (-15, -4.980762114))
            Line((-15, -4.980762114), (-16.706491257, -7.936491673))
            Line((-16.706491257, -7.936491673), (-18, -10.176914535))
            Line((-18, -10.176914535), (-18, -19.823085465))
            Line((-18, -19.823085465), (-16.706491257, -22.063508327))
            Line((-16.706491257, -22.063508327), (-14.648478541, -25.628090913))
            ThreePointArc((-14.648478541, -25.628090913), (-14.911730056, -24.325747825), (-15, -23))
        make_face()
    extrude(amount=INTERSECT1_DEPTH, mode=Mode.SUBTRACT)


solid = part.part
